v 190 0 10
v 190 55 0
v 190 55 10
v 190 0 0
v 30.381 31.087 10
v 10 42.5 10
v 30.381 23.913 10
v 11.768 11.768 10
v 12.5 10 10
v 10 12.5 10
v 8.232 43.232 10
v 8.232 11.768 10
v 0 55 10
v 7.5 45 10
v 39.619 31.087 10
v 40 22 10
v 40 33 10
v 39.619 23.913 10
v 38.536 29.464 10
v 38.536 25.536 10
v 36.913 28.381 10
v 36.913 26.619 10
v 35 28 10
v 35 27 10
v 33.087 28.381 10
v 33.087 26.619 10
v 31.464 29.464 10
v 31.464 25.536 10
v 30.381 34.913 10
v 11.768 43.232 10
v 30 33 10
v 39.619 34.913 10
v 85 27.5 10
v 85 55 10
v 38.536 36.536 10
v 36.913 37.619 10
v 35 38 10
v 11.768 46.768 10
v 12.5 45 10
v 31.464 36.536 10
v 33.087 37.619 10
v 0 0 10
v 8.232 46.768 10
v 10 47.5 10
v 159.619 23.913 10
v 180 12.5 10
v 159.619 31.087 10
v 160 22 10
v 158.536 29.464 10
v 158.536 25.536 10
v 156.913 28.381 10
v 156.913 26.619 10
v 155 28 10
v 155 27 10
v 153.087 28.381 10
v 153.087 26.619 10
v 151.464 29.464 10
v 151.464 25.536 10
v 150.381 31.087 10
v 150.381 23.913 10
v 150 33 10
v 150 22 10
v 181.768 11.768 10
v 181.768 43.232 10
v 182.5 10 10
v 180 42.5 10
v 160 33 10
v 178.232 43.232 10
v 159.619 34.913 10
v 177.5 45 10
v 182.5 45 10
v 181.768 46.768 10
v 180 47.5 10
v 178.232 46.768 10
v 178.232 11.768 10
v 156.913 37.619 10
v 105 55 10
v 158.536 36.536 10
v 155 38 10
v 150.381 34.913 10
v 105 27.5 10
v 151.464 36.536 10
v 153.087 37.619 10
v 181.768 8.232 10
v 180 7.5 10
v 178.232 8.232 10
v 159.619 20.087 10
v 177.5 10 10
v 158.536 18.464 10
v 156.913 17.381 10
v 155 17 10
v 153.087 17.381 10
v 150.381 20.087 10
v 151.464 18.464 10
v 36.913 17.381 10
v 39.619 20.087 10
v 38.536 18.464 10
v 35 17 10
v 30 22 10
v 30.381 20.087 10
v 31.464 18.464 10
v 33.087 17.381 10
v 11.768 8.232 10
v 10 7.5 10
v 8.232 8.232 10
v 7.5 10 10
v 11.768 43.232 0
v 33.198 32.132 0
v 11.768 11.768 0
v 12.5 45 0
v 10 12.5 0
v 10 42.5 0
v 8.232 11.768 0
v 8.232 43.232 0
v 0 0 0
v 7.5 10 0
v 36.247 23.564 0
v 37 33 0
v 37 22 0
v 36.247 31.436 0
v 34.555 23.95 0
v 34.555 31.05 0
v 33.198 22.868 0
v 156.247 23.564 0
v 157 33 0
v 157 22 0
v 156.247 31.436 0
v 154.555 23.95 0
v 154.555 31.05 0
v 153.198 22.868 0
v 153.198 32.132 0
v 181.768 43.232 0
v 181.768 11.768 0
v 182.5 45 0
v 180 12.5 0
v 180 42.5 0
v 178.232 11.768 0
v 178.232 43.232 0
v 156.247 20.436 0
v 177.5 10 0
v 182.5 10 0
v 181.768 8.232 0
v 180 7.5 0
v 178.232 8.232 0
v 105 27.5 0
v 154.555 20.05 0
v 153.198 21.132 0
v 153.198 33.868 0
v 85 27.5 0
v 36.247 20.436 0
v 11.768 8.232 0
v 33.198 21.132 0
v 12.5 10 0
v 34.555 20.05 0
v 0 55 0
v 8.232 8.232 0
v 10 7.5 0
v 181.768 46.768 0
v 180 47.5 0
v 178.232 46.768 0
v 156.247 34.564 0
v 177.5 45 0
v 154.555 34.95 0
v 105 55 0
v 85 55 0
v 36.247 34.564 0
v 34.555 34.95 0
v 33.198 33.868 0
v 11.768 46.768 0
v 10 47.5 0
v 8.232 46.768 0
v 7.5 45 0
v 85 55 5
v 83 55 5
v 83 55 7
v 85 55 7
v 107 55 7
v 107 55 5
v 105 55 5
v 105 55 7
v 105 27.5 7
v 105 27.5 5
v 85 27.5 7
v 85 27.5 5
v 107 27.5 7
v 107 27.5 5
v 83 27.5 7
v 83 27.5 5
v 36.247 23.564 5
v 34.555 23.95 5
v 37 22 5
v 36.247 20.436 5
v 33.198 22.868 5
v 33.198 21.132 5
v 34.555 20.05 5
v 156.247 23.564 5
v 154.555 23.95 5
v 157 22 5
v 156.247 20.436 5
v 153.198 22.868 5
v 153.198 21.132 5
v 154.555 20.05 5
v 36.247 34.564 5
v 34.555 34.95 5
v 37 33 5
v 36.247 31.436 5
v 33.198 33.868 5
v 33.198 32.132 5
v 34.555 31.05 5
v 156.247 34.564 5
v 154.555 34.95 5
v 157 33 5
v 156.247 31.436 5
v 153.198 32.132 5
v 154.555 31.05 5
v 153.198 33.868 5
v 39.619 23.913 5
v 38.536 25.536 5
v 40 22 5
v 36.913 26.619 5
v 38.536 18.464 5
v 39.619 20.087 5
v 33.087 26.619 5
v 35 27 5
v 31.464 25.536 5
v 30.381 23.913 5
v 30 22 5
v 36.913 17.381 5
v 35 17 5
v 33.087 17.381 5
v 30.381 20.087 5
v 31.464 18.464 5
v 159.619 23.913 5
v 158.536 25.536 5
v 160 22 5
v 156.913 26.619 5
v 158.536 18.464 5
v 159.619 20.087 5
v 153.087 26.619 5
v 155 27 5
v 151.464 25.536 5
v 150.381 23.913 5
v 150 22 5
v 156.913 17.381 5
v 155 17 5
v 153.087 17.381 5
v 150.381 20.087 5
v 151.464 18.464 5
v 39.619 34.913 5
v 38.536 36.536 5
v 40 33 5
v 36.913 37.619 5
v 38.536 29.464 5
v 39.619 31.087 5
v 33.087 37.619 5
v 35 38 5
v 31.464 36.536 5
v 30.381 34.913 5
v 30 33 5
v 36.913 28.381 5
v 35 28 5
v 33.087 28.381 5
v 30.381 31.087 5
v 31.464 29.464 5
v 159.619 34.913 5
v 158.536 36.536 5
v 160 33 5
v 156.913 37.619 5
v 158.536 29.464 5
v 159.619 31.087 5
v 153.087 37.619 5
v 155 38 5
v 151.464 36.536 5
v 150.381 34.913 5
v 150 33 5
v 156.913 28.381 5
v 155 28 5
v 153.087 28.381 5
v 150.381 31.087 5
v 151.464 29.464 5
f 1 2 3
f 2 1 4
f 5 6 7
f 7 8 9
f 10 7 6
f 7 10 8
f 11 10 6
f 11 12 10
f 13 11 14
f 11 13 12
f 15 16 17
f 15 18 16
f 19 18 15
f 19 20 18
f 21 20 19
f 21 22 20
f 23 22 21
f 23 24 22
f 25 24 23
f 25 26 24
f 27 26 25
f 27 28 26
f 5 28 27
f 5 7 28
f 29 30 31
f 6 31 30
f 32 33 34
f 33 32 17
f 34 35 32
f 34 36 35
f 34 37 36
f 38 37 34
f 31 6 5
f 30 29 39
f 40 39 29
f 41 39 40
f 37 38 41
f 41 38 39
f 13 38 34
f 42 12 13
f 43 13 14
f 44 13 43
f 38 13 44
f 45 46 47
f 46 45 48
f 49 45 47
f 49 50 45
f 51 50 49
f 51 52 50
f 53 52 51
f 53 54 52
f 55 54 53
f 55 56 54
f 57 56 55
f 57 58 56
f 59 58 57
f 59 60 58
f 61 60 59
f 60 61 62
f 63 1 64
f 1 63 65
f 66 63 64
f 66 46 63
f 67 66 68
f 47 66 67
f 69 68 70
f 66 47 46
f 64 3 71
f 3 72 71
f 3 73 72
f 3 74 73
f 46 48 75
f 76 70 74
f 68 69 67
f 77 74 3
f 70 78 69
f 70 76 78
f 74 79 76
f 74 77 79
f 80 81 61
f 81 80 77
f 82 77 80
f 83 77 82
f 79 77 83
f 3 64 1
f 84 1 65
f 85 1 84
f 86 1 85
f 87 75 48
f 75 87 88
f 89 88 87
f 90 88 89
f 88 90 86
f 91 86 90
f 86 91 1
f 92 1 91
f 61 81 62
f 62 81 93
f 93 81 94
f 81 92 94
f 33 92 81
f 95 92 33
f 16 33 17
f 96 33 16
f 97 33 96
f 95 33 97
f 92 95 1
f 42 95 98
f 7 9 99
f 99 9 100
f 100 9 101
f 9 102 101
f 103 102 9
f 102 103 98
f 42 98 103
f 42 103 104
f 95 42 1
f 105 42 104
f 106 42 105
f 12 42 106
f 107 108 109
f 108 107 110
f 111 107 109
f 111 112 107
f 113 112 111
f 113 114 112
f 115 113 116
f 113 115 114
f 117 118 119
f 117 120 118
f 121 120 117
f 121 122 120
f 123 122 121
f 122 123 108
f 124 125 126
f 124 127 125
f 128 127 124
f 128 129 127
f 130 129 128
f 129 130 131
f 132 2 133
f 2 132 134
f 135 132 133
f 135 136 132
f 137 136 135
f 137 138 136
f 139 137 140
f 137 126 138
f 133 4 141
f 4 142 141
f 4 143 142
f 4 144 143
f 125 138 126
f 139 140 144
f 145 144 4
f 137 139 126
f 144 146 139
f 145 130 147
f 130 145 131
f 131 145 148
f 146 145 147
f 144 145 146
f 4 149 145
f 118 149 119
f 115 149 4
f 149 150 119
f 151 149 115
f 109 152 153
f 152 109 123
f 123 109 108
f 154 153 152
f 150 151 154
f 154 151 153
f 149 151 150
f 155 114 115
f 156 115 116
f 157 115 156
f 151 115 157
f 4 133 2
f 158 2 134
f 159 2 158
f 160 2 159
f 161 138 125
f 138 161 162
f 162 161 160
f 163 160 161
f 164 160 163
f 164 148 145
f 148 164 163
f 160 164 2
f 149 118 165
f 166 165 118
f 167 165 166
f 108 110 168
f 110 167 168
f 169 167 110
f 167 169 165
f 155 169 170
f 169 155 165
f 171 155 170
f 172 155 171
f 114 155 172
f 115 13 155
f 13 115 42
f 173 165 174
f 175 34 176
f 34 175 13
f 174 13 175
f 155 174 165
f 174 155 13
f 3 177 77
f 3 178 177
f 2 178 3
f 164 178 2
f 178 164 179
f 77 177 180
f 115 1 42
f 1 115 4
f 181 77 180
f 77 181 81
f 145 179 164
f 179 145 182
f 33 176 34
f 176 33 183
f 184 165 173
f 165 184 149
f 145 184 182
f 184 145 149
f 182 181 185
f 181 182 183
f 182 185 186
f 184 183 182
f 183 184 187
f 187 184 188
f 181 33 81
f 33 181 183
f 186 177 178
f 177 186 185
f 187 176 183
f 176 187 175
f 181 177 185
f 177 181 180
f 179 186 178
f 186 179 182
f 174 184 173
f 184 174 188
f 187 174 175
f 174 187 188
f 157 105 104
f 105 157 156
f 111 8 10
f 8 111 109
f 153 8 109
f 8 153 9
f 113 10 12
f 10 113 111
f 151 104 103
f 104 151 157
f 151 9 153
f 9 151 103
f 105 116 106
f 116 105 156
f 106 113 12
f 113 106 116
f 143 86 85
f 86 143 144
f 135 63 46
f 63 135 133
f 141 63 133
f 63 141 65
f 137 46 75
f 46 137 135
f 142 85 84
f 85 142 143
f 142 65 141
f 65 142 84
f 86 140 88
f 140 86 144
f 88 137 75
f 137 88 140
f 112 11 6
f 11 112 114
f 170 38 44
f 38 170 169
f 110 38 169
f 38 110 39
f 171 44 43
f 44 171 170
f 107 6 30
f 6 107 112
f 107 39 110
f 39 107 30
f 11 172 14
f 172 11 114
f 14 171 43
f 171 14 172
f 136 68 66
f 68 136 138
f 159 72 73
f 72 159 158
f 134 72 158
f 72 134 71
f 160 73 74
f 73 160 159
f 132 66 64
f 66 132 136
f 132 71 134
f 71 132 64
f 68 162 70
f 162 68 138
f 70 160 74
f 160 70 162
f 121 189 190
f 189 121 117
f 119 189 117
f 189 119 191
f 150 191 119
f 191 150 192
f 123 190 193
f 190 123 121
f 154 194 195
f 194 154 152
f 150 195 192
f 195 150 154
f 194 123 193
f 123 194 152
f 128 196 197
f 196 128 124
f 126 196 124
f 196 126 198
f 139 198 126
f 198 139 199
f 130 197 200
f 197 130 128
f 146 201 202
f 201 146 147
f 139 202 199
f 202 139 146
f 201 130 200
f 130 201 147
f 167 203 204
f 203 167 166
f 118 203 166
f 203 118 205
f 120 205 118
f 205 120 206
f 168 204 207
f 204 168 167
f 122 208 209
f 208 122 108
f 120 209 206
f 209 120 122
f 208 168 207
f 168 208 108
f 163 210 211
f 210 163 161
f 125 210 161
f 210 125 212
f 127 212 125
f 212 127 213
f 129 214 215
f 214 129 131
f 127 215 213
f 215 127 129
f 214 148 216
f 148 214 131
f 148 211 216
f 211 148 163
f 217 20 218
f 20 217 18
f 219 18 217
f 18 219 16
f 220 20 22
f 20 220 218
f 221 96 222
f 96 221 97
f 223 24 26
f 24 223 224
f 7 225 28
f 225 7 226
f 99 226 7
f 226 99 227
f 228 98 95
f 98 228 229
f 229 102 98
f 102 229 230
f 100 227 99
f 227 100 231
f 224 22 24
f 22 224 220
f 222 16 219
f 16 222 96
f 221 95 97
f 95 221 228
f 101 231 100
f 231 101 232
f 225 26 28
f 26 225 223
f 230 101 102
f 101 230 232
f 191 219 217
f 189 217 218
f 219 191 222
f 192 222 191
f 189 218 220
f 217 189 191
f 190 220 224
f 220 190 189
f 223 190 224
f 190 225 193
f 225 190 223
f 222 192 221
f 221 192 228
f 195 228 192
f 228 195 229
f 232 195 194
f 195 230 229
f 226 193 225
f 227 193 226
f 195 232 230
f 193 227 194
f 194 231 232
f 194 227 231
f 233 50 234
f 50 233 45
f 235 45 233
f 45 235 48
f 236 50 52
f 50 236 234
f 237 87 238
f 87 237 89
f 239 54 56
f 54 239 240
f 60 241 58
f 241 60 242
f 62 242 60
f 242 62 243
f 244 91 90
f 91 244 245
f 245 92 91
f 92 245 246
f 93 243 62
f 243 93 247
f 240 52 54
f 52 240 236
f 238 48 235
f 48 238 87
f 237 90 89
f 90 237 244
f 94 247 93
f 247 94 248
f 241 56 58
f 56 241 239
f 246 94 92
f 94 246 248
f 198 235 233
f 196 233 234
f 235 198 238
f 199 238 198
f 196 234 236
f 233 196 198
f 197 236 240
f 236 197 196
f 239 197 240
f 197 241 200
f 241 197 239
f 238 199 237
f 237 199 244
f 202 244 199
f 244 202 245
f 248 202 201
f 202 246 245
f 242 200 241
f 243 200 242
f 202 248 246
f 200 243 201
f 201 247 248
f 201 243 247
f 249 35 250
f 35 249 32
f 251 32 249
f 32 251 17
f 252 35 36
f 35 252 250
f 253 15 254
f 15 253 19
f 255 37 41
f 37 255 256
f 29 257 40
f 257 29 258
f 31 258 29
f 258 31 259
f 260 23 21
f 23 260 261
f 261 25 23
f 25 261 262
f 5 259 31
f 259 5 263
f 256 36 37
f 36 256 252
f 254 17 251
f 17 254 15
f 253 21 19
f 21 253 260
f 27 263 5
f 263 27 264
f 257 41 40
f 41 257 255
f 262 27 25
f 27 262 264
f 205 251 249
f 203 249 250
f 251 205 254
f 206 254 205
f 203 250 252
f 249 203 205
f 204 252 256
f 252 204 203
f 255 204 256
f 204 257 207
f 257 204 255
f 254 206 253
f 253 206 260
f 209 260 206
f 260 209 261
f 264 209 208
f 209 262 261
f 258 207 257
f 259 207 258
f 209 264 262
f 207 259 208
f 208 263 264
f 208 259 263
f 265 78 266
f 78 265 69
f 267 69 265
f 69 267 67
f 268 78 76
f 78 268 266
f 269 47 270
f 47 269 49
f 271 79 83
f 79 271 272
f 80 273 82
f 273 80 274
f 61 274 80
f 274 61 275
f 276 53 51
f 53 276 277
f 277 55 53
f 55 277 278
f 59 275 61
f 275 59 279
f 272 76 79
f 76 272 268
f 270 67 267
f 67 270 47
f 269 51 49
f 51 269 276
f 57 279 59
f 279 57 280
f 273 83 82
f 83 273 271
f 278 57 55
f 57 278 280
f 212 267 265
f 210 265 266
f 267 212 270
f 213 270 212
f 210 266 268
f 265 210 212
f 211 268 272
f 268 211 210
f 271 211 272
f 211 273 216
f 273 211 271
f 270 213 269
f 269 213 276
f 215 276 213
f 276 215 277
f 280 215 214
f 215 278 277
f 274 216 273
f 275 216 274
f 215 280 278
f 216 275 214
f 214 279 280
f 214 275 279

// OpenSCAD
BoxW=190;
BoxD=55;
BoxH=10;
FromEdge=10;
MountHole=5;
displayHole=4;
ScrewHead=10;
xdist=120;
ydist=11;
xDFE=(BoxW-xdist)/2;
yDFE=(BoxD-ydist)/2;
DrillLen=BoxH*2;

difference()
{
  cube([BoxW,BoxD,BoxH]);
  translate([BoxW/2-10,BoxD/2,-1]) cube([20,BoxD,BoxH+2]);
  translate([BoxW/2-12,BoxD/2,BoxH/2]) cube([24,BoxD,2]);
  translate([FromEdge,FromEdge,-5]) cylinder(h=DrillLen,d=MountHole);
  translate([BoxW-FromEdge,FromEdge,-5]) cylinder(h=DrillLen,d=MountHole);   
  translate([FromEdge,BoxD-FromEdge,-5]) cylinder(h=DrillLen,d=MountHole);
  translate([BoxW-FromEdge,BoxD-FromEdge,-5]) cylinder(h=DrillLen,d=MountHole);   

  translate([xDFE,yDFE,-5]) cylinder(h=DrillLen,d=displayHole);
  translate([xDFE+xdist,yDFE,-5]) cylinder(h=DrillLen,d=displayHole);   
  translate([xDFE,yDFE+ydist,-5]) cylinder(h=DrillLen,d=displayHole);
  translate([xDFE+xdist,yDFE+ydist,-5]) cylinder(h=DrillLen,d=displayHole);
  
  translate([xDFE,yDFE,5]) cylinder(h=DrillLen,d=ScrewHead);
  translate([xDFE+xdist,yDFE,5]) cylinder(h=DrillLen,d=ScrewHead);   
  translate([xDFE,yDFE+ydist,5]) cylinder(h=DrillLen,d=ScrewHead);
  translate([xDFE+xdist,yDFE+ydist,5]) cylinder(h=DrillLen,d=ScrewHead);   

}
